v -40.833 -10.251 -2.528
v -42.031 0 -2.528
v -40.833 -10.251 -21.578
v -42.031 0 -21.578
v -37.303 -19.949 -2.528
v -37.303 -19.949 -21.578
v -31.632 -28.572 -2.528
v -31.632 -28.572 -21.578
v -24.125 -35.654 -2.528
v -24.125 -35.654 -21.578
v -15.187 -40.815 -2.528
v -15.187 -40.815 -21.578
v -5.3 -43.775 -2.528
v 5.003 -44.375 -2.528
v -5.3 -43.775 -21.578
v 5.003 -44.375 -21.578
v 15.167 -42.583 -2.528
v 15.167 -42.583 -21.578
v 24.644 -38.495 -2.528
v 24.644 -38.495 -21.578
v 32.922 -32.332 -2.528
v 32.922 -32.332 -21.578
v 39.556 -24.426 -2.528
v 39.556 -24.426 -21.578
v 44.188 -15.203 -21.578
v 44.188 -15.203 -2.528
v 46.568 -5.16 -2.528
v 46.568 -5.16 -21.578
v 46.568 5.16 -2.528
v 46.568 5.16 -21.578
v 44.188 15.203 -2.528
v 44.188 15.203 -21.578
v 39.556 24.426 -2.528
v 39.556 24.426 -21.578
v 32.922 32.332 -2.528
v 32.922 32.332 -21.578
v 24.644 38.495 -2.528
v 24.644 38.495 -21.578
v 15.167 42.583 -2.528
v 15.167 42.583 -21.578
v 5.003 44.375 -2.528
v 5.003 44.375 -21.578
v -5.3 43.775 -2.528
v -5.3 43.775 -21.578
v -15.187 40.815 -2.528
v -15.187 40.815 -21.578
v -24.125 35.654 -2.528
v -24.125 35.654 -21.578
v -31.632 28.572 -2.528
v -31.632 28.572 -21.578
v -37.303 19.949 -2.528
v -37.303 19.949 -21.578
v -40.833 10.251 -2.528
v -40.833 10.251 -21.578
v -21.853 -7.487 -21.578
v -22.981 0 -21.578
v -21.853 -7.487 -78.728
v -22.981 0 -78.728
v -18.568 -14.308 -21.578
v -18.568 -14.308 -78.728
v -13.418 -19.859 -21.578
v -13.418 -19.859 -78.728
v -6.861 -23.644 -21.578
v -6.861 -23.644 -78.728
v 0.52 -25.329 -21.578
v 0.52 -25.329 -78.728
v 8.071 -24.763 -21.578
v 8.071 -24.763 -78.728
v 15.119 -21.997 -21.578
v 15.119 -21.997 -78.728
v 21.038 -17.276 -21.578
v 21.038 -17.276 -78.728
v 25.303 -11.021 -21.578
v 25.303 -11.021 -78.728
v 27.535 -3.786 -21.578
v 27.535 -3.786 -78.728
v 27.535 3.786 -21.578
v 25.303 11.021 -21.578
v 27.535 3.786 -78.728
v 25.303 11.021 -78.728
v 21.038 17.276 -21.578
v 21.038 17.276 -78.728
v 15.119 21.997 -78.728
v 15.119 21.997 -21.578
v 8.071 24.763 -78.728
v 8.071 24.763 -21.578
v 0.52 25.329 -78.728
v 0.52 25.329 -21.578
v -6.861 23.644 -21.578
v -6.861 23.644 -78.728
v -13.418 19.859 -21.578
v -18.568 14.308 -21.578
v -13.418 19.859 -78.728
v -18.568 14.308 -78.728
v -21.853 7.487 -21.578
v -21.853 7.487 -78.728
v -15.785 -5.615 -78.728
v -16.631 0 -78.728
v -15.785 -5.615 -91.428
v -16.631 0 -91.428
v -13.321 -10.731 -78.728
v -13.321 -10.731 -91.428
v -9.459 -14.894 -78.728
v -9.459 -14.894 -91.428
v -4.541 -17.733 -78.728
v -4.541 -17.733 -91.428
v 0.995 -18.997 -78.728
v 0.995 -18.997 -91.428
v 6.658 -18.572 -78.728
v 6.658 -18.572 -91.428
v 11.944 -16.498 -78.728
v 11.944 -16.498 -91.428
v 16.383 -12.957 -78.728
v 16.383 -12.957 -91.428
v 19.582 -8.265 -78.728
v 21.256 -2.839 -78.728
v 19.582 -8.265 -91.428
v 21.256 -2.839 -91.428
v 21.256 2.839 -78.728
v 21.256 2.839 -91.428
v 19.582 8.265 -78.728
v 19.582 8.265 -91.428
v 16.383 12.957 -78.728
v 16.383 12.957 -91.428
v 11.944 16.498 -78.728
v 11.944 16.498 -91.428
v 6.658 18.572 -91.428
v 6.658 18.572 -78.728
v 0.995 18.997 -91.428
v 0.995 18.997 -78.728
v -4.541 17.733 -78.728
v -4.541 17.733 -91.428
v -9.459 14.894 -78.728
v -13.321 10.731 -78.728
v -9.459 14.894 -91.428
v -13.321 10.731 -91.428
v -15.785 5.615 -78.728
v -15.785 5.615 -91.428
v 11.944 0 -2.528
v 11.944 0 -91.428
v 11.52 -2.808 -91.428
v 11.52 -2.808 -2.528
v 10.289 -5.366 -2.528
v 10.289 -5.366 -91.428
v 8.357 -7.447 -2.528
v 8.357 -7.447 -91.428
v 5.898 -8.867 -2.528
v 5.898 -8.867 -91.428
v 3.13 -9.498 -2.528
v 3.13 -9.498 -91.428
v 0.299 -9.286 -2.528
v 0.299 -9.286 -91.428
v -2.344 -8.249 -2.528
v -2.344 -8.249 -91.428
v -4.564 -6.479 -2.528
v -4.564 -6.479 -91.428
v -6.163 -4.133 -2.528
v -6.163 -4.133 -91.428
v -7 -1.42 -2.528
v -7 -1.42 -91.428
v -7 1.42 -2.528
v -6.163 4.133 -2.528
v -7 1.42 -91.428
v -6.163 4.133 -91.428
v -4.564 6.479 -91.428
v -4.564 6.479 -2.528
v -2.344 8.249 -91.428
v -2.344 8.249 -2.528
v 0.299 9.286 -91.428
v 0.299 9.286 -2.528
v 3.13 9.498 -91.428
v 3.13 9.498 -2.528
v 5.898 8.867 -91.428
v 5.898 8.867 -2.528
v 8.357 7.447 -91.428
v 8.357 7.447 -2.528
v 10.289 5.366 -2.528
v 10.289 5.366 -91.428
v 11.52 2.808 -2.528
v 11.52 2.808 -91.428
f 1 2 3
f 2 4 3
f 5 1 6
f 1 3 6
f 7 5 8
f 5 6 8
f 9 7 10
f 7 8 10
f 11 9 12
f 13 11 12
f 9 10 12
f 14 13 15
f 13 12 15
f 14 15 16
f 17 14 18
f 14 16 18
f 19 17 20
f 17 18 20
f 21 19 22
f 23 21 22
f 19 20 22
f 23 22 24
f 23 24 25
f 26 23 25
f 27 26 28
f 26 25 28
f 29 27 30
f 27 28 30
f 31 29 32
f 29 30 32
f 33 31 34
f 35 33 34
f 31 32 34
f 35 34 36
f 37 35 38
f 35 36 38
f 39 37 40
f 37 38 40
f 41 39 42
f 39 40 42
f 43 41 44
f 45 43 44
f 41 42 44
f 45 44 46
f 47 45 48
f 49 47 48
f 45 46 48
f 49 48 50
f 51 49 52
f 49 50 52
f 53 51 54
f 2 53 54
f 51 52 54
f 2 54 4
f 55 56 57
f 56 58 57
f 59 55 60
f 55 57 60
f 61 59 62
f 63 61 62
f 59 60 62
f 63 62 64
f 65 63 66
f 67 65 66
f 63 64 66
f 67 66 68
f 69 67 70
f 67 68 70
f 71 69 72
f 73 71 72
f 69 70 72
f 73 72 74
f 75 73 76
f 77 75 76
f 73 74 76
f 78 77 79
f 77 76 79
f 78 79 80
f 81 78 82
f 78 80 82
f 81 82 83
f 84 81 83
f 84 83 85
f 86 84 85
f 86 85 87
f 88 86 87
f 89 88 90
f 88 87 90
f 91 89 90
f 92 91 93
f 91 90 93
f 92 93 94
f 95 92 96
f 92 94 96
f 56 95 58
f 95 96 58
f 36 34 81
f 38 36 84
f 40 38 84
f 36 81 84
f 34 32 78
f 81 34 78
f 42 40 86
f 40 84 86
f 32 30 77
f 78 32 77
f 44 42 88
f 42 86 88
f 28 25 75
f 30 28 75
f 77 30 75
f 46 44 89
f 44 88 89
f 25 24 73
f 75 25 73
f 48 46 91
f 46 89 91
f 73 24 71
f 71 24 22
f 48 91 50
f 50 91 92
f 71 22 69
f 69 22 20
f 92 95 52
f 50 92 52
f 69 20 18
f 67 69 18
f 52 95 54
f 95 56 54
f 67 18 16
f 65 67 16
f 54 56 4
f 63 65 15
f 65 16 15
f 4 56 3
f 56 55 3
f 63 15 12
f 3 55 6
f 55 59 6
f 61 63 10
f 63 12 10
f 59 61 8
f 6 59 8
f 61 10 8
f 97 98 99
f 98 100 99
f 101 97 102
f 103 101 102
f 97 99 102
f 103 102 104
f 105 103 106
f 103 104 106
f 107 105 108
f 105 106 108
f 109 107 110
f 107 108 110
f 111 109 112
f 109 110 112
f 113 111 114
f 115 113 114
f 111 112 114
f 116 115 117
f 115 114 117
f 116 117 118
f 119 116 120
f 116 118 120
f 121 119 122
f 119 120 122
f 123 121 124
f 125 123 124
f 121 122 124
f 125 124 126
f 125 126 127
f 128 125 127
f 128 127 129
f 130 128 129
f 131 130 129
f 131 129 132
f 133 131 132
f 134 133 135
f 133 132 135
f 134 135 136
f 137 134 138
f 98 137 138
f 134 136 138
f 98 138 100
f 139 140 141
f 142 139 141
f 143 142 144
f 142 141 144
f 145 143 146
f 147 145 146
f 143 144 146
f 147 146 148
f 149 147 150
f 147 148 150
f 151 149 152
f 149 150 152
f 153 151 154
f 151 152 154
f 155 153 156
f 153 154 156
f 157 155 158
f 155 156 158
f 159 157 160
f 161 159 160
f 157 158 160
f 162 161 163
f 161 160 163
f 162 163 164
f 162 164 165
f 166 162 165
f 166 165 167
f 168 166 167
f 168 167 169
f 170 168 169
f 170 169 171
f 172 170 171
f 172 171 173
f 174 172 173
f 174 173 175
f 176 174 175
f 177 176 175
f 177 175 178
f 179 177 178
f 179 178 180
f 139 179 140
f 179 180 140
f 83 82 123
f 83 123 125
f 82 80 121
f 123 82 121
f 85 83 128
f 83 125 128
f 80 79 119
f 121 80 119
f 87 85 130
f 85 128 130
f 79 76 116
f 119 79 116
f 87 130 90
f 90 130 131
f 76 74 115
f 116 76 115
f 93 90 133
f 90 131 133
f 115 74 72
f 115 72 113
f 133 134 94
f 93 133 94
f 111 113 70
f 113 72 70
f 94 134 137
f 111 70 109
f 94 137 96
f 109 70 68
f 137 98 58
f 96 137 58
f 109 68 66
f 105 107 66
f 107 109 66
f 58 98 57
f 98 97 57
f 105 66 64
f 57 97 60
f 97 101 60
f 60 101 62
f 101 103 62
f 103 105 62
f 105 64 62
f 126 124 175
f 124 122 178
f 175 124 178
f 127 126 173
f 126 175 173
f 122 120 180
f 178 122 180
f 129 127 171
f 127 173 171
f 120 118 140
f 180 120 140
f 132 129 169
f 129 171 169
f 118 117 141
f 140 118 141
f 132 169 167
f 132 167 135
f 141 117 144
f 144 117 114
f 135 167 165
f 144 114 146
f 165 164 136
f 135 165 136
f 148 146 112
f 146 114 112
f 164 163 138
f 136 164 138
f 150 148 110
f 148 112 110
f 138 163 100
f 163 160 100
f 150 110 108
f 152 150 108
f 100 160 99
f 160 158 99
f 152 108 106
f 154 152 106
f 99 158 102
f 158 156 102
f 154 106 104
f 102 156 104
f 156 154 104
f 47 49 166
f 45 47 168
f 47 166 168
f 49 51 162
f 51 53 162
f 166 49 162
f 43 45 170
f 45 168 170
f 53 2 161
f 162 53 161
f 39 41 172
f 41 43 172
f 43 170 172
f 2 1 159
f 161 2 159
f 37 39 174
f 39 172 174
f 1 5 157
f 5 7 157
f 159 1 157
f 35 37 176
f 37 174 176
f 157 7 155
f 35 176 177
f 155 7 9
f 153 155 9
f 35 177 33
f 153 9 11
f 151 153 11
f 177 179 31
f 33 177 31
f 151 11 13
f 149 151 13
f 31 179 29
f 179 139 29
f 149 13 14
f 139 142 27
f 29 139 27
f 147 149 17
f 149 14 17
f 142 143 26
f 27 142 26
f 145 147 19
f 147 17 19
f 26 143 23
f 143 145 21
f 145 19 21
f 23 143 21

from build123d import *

# Parameters (mm, degrees)
F2_R     = 9.525
F3_DEPTH = 88.9


with BuildPart() as f1:
    # F0 (on Front) → F1 (revolve)
    with BuildSketch(Plane.XZ):
        Polygon((-16.631375, -91.427677), (2.418625, -91.427677), (2.418625, -2.527677), (-42.031375, -2.527677), (-42.031375, -21.577677), (-22.981375, -21.577677), (-22.981375, -78.727677), (-16.631375, -78.727677), align=None)
    revolve(axis=Axis((2.418625, 0, 3.463581), (0, 0, 1)))

    # F2 (on face) → F3 (cut)
    with BuildSketch(Plane(origin=(0, 0, -91.427677), x_dir=(1, 0, 0), z_dir=(0, 0, -1))):
        with Locations((2.418625, 0)):
            Circle(F2_R)
    extrude(amount=-F3_DEPTH, mode=Mode.SUBTRACT)


solid = f1.part
